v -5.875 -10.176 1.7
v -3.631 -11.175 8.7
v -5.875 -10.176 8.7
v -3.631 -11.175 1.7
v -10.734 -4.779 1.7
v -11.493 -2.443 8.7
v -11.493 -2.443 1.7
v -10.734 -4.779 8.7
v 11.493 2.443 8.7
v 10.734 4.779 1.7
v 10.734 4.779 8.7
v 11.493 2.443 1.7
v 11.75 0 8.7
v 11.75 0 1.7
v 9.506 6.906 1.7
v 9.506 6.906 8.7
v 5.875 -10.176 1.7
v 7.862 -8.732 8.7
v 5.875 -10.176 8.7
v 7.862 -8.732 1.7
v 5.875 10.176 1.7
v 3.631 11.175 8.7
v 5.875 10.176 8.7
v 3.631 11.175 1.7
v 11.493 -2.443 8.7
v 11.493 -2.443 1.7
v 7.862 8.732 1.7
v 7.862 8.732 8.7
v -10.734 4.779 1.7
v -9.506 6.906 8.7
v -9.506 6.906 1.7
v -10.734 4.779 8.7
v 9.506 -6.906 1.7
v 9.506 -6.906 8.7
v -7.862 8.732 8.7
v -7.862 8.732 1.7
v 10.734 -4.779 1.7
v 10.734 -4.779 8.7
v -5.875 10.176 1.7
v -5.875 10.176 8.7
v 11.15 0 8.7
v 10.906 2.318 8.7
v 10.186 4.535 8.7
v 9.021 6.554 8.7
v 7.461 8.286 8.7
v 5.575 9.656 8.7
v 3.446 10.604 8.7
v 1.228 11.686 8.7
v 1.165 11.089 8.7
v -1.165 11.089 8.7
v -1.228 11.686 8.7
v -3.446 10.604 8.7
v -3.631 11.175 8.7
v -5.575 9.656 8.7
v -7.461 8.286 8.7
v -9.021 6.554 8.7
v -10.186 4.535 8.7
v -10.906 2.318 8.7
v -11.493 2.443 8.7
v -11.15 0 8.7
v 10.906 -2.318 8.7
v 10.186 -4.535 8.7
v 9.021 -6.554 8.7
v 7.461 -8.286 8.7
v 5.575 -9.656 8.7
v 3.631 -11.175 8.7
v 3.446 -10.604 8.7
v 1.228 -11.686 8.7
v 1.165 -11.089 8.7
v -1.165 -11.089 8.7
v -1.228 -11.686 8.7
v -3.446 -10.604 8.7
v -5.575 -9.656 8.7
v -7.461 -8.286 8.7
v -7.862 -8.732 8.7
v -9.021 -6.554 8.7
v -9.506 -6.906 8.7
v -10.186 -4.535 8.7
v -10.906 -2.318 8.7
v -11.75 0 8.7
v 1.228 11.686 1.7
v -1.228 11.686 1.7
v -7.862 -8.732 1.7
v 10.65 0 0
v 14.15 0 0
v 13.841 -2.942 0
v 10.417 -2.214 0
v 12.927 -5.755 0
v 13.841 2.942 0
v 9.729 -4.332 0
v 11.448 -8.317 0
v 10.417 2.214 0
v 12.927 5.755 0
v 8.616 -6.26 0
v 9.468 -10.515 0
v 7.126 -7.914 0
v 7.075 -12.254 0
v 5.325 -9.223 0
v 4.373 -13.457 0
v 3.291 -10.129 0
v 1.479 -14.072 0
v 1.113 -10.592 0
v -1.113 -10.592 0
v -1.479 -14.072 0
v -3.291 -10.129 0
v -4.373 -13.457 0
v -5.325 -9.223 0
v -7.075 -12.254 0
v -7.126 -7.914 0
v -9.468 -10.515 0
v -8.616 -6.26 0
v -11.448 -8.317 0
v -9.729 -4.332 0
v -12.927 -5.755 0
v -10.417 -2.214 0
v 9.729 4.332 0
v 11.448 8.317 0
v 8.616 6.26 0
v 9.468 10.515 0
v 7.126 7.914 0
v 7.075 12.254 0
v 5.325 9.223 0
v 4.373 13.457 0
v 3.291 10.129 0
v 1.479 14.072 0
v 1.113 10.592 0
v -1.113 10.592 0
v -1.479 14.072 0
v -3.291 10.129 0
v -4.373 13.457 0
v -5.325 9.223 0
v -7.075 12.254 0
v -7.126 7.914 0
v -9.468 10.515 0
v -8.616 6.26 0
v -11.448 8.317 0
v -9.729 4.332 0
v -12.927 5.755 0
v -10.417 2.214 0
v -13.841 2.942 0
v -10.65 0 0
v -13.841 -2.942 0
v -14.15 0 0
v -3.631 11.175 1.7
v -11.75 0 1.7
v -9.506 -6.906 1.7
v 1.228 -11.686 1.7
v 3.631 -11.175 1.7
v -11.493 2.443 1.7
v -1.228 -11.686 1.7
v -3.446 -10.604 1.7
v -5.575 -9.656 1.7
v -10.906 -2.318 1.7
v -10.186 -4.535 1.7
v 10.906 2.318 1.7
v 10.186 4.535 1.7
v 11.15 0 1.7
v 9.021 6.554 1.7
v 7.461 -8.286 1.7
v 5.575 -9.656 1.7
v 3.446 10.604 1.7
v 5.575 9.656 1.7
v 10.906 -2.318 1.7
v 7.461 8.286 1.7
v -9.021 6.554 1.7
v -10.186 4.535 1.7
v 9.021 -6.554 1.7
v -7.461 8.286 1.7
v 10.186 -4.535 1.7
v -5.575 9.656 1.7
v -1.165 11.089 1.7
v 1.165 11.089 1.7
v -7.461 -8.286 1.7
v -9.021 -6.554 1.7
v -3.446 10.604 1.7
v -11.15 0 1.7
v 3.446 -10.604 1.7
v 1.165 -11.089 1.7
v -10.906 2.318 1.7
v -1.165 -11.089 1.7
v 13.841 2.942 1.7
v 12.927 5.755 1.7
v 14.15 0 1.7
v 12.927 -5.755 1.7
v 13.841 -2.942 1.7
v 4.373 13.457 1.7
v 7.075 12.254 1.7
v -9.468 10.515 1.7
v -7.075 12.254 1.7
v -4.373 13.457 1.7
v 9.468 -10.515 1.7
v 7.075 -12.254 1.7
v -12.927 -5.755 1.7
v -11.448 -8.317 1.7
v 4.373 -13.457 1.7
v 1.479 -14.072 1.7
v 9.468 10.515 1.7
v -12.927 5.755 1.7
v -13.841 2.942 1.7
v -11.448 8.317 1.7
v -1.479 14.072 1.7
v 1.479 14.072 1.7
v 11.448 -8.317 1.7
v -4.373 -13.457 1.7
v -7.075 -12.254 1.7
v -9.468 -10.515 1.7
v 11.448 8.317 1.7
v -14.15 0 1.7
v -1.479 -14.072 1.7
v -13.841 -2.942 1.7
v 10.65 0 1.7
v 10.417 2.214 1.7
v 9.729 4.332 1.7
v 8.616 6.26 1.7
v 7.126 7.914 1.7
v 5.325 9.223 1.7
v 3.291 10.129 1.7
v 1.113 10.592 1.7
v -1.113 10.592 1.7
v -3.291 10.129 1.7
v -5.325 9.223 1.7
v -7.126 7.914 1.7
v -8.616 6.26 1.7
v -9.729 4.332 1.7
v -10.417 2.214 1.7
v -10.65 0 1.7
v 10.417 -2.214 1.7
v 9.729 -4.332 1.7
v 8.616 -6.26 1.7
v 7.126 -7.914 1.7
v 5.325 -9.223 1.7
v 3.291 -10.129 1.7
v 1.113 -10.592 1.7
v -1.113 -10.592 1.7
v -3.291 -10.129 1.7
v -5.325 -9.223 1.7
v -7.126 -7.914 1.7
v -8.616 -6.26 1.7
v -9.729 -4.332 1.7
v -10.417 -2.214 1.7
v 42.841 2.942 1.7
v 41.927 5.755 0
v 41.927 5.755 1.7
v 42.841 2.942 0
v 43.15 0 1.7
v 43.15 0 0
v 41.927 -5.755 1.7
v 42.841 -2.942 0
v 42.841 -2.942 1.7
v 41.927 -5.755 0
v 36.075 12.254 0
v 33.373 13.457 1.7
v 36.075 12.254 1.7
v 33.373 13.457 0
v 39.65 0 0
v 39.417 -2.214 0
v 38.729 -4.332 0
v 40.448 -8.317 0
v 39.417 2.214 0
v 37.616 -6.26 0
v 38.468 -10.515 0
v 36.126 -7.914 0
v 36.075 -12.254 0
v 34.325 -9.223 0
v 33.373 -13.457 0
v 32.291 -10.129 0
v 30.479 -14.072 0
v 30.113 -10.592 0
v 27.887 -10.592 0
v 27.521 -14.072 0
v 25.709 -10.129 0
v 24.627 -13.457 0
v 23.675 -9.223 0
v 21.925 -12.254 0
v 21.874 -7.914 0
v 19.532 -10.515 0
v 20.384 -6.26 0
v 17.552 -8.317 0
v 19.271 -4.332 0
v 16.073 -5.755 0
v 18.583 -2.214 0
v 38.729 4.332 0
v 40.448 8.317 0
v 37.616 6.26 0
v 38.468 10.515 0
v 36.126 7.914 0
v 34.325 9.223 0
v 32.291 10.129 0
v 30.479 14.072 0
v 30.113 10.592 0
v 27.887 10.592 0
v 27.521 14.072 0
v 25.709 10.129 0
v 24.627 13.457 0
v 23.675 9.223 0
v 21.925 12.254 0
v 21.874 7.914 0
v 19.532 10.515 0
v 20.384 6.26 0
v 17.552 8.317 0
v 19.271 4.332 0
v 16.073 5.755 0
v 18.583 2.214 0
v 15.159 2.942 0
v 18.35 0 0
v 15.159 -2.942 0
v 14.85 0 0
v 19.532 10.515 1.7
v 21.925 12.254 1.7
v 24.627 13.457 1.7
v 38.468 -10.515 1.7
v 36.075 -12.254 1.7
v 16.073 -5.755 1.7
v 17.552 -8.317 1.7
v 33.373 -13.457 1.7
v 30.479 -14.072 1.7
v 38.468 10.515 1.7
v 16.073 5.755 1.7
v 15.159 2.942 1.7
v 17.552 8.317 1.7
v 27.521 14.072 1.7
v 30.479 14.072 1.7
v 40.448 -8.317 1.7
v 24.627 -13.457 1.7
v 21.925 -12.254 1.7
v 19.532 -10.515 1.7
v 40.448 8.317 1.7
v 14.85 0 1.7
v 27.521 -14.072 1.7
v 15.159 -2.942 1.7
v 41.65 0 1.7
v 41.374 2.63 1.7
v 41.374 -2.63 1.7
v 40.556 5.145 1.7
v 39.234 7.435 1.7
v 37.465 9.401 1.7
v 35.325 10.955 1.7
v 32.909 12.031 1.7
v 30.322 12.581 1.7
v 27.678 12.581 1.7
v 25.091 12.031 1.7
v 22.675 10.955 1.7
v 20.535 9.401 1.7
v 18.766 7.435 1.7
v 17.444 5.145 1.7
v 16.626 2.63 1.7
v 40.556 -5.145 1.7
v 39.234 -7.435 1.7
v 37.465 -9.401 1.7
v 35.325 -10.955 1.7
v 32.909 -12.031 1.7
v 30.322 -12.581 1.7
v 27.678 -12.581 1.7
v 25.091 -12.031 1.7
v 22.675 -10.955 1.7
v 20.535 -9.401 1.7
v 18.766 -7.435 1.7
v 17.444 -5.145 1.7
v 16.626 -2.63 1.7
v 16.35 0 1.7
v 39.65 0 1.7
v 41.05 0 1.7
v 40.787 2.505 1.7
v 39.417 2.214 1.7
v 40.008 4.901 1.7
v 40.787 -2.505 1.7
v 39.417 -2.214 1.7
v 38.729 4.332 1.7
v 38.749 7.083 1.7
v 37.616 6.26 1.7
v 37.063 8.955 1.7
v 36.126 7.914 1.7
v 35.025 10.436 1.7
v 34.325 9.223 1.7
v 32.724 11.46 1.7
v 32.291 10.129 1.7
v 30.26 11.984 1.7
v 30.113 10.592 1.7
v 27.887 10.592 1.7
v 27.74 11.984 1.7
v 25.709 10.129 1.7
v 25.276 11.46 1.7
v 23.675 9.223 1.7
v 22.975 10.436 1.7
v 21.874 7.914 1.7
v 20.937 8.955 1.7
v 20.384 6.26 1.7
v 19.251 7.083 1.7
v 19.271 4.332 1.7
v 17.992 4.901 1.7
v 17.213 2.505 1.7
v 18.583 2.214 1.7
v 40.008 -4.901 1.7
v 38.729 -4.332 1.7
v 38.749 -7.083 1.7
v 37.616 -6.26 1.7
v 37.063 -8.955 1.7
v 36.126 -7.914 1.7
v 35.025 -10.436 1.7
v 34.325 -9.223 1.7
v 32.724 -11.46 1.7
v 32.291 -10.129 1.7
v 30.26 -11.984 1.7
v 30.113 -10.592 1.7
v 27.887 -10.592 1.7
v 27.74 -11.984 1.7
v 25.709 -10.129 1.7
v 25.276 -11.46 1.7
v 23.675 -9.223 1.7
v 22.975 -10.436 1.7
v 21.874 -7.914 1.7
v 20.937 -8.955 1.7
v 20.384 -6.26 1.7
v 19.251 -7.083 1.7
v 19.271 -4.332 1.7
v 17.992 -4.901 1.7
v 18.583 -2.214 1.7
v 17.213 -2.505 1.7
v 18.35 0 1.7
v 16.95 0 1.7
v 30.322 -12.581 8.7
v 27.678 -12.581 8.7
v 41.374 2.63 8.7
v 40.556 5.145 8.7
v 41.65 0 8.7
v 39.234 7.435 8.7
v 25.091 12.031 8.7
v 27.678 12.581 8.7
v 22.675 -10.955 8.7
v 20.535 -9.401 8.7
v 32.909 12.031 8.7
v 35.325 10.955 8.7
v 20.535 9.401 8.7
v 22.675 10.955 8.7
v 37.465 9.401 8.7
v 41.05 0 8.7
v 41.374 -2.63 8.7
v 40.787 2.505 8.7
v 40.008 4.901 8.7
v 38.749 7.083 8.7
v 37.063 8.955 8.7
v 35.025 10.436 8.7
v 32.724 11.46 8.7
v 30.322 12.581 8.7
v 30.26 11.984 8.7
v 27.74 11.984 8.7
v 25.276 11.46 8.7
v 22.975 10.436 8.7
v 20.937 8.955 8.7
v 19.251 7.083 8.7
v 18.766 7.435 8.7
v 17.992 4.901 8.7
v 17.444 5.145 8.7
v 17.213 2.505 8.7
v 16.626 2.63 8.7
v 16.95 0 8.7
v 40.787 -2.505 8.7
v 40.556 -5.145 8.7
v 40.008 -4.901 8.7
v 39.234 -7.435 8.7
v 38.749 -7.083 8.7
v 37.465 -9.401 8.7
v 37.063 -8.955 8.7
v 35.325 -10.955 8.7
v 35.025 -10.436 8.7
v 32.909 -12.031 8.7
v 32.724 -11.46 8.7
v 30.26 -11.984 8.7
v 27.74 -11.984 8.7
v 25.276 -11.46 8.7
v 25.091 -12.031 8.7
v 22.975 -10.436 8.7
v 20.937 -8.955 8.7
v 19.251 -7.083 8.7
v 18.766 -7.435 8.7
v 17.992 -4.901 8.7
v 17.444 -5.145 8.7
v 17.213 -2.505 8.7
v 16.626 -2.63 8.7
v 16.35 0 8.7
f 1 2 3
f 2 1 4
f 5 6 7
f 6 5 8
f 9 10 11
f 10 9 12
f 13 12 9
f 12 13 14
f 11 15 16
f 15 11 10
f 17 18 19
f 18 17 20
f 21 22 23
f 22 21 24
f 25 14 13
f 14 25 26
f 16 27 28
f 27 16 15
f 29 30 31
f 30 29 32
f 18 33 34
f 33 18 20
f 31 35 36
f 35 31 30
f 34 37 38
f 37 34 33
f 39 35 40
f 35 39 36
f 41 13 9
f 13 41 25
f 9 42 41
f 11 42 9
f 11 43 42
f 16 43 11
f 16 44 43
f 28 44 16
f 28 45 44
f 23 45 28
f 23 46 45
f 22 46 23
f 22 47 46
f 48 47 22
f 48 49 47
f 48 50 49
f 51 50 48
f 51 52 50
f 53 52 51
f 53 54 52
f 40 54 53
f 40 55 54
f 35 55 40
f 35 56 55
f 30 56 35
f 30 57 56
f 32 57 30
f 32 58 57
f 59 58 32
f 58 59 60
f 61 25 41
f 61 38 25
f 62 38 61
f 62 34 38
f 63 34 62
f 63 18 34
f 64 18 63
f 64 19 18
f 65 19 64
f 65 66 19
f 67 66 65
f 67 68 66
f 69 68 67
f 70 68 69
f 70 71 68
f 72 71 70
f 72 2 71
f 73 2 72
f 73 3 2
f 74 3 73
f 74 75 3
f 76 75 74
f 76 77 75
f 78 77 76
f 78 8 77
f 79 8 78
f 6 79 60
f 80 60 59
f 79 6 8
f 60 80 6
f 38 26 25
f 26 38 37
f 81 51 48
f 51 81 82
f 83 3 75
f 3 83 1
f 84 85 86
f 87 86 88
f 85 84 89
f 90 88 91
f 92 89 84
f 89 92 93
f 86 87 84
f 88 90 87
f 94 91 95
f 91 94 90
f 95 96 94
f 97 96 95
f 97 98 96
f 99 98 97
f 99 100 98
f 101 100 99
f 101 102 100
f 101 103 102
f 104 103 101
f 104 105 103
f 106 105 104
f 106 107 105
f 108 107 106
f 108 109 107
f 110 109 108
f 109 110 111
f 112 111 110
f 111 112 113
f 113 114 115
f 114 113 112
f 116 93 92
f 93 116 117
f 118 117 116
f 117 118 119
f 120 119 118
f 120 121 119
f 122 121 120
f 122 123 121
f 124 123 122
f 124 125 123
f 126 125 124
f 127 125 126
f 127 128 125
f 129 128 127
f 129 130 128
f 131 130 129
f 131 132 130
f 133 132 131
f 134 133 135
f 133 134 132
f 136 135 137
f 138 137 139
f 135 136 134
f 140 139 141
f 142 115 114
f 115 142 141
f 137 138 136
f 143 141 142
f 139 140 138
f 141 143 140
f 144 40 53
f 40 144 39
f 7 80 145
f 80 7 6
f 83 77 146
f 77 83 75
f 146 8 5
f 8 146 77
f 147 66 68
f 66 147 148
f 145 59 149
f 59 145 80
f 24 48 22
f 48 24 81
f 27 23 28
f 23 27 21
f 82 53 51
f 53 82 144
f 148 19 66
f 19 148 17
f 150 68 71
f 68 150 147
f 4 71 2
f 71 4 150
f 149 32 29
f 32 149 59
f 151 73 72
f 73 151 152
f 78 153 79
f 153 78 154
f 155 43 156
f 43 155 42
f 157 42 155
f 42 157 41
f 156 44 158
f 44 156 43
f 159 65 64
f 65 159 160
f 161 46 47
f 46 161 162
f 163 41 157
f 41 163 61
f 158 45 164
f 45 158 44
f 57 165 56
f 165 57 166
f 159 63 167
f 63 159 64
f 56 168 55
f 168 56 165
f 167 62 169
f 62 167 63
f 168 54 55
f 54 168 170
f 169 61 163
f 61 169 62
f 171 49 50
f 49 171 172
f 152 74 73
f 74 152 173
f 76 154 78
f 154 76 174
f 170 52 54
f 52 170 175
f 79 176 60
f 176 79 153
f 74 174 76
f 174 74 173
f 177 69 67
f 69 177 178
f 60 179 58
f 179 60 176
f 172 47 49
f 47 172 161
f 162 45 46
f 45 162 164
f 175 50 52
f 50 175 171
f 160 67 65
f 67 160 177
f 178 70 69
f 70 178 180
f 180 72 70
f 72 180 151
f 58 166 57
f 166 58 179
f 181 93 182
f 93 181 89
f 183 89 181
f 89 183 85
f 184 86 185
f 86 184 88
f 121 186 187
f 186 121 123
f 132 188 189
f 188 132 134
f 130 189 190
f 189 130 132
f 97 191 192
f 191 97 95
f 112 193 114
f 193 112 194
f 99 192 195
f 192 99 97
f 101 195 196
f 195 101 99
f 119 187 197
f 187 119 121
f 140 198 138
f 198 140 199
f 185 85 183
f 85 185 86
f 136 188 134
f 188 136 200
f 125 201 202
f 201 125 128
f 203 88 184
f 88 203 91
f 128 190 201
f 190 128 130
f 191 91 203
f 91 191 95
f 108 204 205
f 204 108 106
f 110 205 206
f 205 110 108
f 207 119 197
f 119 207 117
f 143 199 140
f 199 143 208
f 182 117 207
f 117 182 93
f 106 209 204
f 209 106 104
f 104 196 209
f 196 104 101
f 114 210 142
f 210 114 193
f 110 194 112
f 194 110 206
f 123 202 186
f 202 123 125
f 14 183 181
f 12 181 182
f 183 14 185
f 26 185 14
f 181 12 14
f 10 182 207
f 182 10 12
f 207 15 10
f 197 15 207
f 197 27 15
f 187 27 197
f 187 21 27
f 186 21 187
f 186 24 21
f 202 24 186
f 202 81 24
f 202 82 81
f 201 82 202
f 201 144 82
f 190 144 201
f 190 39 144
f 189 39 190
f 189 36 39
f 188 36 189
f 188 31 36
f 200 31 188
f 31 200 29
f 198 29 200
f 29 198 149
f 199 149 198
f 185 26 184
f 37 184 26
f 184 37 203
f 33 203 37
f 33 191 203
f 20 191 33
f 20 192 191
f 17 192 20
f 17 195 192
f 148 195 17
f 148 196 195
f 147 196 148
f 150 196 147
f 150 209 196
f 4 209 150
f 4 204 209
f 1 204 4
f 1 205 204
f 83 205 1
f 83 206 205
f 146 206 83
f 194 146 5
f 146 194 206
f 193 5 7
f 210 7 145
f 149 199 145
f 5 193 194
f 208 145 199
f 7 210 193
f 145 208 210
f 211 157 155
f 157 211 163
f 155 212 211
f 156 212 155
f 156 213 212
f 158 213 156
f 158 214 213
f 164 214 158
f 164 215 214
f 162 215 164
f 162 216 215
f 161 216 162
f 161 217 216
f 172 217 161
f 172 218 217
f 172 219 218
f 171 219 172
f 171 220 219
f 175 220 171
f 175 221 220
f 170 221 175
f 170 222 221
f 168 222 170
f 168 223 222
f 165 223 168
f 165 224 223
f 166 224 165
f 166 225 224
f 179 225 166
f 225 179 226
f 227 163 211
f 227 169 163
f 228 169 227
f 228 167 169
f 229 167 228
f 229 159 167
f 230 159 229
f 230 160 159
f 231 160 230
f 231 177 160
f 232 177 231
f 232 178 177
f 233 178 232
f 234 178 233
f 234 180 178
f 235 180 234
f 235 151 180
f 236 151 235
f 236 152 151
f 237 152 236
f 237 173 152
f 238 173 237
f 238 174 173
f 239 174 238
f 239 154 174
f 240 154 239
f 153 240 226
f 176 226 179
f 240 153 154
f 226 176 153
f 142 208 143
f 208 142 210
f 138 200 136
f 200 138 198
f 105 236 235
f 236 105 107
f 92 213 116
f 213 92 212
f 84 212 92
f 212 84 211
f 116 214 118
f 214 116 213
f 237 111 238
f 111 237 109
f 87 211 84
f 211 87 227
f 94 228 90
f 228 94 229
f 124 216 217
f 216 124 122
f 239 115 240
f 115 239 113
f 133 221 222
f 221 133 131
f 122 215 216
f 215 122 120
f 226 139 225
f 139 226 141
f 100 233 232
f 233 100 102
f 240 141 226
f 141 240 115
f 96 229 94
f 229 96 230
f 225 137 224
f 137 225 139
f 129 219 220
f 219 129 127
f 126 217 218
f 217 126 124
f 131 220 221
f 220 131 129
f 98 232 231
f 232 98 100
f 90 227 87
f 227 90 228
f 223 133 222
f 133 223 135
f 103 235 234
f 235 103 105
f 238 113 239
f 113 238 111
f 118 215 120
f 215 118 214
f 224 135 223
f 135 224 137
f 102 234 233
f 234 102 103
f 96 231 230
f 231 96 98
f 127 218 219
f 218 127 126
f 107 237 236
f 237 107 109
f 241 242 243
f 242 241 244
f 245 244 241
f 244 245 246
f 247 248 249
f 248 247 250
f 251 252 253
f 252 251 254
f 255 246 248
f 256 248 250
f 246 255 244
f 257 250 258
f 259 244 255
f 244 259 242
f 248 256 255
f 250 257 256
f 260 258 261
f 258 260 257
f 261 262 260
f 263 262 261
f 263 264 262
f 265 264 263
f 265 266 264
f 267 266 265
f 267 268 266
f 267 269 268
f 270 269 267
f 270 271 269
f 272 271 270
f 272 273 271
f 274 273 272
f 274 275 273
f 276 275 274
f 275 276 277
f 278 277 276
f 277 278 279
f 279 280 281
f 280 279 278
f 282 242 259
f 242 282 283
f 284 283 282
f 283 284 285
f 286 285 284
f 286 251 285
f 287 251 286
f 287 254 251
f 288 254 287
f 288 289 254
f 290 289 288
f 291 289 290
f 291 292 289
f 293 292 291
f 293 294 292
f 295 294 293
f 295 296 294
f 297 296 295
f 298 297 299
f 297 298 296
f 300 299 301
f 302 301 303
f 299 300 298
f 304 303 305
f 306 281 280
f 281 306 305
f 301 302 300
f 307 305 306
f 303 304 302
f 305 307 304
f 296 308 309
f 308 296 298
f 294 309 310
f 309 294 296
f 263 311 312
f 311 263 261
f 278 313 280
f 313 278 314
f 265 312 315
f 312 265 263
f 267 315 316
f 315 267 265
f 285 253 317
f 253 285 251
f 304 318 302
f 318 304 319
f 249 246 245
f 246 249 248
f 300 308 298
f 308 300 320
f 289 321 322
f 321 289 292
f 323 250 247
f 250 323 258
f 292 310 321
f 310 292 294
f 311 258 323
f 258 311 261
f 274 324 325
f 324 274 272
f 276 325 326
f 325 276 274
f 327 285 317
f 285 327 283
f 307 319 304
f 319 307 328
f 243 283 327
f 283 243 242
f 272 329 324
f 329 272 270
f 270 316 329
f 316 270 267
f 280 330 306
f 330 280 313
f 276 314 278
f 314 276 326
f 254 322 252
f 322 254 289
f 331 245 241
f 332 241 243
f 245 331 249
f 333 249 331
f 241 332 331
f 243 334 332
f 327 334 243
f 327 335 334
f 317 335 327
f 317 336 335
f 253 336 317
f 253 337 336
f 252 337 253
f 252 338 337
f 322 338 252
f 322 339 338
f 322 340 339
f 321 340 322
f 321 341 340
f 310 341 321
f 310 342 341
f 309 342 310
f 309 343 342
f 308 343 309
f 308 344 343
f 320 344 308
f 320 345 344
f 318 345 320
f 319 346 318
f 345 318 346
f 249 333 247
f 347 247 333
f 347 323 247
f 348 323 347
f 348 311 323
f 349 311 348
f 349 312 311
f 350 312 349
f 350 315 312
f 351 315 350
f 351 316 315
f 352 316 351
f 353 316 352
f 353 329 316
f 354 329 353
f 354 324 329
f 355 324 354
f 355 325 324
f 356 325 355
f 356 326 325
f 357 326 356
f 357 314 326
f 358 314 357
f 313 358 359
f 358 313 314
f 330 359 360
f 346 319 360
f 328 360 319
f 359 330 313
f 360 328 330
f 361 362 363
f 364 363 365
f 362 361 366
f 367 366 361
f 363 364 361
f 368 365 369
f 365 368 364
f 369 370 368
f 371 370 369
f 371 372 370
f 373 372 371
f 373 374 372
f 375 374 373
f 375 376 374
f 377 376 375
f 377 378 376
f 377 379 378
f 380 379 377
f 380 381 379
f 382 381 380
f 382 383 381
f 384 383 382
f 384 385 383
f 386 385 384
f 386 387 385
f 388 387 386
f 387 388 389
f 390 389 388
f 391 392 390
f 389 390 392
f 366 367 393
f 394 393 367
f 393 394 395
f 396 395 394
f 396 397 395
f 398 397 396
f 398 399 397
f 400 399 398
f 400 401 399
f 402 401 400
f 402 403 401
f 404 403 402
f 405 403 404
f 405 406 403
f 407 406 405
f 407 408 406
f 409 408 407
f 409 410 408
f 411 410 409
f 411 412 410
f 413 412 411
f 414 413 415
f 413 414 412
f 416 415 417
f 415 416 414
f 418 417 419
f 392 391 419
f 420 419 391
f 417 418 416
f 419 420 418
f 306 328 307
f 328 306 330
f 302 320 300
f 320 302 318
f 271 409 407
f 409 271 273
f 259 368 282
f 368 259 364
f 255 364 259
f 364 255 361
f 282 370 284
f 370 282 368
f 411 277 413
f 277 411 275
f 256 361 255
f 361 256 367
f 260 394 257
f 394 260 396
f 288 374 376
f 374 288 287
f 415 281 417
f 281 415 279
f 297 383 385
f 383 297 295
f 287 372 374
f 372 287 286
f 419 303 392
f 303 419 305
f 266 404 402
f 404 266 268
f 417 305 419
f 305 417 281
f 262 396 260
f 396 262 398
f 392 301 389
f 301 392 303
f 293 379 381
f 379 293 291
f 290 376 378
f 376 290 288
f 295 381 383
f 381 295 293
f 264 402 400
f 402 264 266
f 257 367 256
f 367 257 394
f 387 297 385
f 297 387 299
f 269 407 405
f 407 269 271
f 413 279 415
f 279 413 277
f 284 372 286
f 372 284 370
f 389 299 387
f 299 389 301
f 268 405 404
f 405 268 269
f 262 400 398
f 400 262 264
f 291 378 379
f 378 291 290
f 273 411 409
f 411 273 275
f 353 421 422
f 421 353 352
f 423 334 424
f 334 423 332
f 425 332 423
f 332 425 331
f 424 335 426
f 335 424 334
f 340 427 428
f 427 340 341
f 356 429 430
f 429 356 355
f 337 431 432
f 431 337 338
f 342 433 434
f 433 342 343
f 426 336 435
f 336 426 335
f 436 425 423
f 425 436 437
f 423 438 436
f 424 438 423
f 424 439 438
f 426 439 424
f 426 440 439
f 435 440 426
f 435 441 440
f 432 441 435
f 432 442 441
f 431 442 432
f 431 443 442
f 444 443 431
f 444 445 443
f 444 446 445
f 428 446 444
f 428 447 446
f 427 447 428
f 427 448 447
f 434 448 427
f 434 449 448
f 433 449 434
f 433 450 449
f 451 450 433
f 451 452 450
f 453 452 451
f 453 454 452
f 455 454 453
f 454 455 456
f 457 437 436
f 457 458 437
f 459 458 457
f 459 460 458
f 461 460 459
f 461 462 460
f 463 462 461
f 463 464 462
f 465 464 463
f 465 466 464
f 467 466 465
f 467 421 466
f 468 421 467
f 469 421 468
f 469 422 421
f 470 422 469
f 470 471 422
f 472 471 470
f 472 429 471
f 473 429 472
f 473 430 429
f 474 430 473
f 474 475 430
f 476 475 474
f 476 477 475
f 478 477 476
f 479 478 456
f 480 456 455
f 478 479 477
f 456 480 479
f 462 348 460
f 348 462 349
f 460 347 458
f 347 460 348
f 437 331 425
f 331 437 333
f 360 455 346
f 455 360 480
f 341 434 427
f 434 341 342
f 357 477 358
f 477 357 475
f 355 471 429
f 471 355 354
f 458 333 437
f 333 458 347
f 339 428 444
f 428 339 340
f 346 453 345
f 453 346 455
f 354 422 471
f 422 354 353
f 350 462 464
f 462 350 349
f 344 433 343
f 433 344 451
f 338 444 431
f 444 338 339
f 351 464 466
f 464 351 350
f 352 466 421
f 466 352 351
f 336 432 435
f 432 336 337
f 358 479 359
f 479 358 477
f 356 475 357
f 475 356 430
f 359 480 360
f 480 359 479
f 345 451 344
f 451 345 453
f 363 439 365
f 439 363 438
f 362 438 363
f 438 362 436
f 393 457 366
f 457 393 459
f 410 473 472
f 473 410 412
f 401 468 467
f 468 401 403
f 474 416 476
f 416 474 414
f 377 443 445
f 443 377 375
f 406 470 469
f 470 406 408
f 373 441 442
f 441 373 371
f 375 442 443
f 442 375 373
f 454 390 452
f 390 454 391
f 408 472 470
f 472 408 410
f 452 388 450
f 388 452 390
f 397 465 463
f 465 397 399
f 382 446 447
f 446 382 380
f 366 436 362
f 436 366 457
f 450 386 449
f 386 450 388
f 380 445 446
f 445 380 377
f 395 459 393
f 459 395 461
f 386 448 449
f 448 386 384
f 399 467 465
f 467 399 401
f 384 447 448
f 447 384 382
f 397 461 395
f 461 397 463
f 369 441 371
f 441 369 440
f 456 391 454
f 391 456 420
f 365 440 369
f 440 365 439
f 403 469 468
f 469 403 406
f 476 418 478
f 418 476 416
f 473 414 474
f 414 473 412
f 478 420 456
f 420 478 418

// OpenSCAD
// This one is AWESOME design by Greg Frost!!

// PRUSA Mendel  
// Bearing guide
// GNU GPL v3
// Josef Průša
// josefprusa@me.com
// prusadjs.cz
// http://www.reprap.org/wiki/Prusa_Mendel
// http://github.com/prusajr/PrusaMendel


/**
 * Helps to hold belt aligned on the bearing.
 * @id bearing-guide
 * @name Bearing guide
 * @category Printed
 */

single_layer_width=0.6;
bearing_inner=22.3;
thickness=1.7;
height=7+thickness;
wall_ascent=3;
wall_descent=0.5;

module inner()
{
	difference()
	{
		cylinder(r=bearing_inner/2+single_layer_width,h=height);
		translate([0,0,-1])
		cylinder(r=bearing_inner/2,h=height+2);
	}

	difference()
	{
		cylinder(r=bearing_inner/2+wall_ascent,h=thickness);
		translate([0,0,-1])
		cylinder(r=bearing_inner/2-wall_descent,h=thickness+2);
	}
}

module outer()
{
	difference()
	{
		cylinder(r=bearing_inner/2+2*single_layer_width+0.3,h=height);
		translate([0,0,-1])
		cylinder(r=bearing_inner/2+single_layer_width+0.3,h=height+2);
	}

	difference()
	{
		cylinder(r=bearing_inner/2+wall_ascent,h=thickness);
		translate([0,0,-1])
		cylinder(r=bearing_inner/2-wall_descent,h=thickness+2);
	}
}

inner();

translate([29,0,0])
outer();
